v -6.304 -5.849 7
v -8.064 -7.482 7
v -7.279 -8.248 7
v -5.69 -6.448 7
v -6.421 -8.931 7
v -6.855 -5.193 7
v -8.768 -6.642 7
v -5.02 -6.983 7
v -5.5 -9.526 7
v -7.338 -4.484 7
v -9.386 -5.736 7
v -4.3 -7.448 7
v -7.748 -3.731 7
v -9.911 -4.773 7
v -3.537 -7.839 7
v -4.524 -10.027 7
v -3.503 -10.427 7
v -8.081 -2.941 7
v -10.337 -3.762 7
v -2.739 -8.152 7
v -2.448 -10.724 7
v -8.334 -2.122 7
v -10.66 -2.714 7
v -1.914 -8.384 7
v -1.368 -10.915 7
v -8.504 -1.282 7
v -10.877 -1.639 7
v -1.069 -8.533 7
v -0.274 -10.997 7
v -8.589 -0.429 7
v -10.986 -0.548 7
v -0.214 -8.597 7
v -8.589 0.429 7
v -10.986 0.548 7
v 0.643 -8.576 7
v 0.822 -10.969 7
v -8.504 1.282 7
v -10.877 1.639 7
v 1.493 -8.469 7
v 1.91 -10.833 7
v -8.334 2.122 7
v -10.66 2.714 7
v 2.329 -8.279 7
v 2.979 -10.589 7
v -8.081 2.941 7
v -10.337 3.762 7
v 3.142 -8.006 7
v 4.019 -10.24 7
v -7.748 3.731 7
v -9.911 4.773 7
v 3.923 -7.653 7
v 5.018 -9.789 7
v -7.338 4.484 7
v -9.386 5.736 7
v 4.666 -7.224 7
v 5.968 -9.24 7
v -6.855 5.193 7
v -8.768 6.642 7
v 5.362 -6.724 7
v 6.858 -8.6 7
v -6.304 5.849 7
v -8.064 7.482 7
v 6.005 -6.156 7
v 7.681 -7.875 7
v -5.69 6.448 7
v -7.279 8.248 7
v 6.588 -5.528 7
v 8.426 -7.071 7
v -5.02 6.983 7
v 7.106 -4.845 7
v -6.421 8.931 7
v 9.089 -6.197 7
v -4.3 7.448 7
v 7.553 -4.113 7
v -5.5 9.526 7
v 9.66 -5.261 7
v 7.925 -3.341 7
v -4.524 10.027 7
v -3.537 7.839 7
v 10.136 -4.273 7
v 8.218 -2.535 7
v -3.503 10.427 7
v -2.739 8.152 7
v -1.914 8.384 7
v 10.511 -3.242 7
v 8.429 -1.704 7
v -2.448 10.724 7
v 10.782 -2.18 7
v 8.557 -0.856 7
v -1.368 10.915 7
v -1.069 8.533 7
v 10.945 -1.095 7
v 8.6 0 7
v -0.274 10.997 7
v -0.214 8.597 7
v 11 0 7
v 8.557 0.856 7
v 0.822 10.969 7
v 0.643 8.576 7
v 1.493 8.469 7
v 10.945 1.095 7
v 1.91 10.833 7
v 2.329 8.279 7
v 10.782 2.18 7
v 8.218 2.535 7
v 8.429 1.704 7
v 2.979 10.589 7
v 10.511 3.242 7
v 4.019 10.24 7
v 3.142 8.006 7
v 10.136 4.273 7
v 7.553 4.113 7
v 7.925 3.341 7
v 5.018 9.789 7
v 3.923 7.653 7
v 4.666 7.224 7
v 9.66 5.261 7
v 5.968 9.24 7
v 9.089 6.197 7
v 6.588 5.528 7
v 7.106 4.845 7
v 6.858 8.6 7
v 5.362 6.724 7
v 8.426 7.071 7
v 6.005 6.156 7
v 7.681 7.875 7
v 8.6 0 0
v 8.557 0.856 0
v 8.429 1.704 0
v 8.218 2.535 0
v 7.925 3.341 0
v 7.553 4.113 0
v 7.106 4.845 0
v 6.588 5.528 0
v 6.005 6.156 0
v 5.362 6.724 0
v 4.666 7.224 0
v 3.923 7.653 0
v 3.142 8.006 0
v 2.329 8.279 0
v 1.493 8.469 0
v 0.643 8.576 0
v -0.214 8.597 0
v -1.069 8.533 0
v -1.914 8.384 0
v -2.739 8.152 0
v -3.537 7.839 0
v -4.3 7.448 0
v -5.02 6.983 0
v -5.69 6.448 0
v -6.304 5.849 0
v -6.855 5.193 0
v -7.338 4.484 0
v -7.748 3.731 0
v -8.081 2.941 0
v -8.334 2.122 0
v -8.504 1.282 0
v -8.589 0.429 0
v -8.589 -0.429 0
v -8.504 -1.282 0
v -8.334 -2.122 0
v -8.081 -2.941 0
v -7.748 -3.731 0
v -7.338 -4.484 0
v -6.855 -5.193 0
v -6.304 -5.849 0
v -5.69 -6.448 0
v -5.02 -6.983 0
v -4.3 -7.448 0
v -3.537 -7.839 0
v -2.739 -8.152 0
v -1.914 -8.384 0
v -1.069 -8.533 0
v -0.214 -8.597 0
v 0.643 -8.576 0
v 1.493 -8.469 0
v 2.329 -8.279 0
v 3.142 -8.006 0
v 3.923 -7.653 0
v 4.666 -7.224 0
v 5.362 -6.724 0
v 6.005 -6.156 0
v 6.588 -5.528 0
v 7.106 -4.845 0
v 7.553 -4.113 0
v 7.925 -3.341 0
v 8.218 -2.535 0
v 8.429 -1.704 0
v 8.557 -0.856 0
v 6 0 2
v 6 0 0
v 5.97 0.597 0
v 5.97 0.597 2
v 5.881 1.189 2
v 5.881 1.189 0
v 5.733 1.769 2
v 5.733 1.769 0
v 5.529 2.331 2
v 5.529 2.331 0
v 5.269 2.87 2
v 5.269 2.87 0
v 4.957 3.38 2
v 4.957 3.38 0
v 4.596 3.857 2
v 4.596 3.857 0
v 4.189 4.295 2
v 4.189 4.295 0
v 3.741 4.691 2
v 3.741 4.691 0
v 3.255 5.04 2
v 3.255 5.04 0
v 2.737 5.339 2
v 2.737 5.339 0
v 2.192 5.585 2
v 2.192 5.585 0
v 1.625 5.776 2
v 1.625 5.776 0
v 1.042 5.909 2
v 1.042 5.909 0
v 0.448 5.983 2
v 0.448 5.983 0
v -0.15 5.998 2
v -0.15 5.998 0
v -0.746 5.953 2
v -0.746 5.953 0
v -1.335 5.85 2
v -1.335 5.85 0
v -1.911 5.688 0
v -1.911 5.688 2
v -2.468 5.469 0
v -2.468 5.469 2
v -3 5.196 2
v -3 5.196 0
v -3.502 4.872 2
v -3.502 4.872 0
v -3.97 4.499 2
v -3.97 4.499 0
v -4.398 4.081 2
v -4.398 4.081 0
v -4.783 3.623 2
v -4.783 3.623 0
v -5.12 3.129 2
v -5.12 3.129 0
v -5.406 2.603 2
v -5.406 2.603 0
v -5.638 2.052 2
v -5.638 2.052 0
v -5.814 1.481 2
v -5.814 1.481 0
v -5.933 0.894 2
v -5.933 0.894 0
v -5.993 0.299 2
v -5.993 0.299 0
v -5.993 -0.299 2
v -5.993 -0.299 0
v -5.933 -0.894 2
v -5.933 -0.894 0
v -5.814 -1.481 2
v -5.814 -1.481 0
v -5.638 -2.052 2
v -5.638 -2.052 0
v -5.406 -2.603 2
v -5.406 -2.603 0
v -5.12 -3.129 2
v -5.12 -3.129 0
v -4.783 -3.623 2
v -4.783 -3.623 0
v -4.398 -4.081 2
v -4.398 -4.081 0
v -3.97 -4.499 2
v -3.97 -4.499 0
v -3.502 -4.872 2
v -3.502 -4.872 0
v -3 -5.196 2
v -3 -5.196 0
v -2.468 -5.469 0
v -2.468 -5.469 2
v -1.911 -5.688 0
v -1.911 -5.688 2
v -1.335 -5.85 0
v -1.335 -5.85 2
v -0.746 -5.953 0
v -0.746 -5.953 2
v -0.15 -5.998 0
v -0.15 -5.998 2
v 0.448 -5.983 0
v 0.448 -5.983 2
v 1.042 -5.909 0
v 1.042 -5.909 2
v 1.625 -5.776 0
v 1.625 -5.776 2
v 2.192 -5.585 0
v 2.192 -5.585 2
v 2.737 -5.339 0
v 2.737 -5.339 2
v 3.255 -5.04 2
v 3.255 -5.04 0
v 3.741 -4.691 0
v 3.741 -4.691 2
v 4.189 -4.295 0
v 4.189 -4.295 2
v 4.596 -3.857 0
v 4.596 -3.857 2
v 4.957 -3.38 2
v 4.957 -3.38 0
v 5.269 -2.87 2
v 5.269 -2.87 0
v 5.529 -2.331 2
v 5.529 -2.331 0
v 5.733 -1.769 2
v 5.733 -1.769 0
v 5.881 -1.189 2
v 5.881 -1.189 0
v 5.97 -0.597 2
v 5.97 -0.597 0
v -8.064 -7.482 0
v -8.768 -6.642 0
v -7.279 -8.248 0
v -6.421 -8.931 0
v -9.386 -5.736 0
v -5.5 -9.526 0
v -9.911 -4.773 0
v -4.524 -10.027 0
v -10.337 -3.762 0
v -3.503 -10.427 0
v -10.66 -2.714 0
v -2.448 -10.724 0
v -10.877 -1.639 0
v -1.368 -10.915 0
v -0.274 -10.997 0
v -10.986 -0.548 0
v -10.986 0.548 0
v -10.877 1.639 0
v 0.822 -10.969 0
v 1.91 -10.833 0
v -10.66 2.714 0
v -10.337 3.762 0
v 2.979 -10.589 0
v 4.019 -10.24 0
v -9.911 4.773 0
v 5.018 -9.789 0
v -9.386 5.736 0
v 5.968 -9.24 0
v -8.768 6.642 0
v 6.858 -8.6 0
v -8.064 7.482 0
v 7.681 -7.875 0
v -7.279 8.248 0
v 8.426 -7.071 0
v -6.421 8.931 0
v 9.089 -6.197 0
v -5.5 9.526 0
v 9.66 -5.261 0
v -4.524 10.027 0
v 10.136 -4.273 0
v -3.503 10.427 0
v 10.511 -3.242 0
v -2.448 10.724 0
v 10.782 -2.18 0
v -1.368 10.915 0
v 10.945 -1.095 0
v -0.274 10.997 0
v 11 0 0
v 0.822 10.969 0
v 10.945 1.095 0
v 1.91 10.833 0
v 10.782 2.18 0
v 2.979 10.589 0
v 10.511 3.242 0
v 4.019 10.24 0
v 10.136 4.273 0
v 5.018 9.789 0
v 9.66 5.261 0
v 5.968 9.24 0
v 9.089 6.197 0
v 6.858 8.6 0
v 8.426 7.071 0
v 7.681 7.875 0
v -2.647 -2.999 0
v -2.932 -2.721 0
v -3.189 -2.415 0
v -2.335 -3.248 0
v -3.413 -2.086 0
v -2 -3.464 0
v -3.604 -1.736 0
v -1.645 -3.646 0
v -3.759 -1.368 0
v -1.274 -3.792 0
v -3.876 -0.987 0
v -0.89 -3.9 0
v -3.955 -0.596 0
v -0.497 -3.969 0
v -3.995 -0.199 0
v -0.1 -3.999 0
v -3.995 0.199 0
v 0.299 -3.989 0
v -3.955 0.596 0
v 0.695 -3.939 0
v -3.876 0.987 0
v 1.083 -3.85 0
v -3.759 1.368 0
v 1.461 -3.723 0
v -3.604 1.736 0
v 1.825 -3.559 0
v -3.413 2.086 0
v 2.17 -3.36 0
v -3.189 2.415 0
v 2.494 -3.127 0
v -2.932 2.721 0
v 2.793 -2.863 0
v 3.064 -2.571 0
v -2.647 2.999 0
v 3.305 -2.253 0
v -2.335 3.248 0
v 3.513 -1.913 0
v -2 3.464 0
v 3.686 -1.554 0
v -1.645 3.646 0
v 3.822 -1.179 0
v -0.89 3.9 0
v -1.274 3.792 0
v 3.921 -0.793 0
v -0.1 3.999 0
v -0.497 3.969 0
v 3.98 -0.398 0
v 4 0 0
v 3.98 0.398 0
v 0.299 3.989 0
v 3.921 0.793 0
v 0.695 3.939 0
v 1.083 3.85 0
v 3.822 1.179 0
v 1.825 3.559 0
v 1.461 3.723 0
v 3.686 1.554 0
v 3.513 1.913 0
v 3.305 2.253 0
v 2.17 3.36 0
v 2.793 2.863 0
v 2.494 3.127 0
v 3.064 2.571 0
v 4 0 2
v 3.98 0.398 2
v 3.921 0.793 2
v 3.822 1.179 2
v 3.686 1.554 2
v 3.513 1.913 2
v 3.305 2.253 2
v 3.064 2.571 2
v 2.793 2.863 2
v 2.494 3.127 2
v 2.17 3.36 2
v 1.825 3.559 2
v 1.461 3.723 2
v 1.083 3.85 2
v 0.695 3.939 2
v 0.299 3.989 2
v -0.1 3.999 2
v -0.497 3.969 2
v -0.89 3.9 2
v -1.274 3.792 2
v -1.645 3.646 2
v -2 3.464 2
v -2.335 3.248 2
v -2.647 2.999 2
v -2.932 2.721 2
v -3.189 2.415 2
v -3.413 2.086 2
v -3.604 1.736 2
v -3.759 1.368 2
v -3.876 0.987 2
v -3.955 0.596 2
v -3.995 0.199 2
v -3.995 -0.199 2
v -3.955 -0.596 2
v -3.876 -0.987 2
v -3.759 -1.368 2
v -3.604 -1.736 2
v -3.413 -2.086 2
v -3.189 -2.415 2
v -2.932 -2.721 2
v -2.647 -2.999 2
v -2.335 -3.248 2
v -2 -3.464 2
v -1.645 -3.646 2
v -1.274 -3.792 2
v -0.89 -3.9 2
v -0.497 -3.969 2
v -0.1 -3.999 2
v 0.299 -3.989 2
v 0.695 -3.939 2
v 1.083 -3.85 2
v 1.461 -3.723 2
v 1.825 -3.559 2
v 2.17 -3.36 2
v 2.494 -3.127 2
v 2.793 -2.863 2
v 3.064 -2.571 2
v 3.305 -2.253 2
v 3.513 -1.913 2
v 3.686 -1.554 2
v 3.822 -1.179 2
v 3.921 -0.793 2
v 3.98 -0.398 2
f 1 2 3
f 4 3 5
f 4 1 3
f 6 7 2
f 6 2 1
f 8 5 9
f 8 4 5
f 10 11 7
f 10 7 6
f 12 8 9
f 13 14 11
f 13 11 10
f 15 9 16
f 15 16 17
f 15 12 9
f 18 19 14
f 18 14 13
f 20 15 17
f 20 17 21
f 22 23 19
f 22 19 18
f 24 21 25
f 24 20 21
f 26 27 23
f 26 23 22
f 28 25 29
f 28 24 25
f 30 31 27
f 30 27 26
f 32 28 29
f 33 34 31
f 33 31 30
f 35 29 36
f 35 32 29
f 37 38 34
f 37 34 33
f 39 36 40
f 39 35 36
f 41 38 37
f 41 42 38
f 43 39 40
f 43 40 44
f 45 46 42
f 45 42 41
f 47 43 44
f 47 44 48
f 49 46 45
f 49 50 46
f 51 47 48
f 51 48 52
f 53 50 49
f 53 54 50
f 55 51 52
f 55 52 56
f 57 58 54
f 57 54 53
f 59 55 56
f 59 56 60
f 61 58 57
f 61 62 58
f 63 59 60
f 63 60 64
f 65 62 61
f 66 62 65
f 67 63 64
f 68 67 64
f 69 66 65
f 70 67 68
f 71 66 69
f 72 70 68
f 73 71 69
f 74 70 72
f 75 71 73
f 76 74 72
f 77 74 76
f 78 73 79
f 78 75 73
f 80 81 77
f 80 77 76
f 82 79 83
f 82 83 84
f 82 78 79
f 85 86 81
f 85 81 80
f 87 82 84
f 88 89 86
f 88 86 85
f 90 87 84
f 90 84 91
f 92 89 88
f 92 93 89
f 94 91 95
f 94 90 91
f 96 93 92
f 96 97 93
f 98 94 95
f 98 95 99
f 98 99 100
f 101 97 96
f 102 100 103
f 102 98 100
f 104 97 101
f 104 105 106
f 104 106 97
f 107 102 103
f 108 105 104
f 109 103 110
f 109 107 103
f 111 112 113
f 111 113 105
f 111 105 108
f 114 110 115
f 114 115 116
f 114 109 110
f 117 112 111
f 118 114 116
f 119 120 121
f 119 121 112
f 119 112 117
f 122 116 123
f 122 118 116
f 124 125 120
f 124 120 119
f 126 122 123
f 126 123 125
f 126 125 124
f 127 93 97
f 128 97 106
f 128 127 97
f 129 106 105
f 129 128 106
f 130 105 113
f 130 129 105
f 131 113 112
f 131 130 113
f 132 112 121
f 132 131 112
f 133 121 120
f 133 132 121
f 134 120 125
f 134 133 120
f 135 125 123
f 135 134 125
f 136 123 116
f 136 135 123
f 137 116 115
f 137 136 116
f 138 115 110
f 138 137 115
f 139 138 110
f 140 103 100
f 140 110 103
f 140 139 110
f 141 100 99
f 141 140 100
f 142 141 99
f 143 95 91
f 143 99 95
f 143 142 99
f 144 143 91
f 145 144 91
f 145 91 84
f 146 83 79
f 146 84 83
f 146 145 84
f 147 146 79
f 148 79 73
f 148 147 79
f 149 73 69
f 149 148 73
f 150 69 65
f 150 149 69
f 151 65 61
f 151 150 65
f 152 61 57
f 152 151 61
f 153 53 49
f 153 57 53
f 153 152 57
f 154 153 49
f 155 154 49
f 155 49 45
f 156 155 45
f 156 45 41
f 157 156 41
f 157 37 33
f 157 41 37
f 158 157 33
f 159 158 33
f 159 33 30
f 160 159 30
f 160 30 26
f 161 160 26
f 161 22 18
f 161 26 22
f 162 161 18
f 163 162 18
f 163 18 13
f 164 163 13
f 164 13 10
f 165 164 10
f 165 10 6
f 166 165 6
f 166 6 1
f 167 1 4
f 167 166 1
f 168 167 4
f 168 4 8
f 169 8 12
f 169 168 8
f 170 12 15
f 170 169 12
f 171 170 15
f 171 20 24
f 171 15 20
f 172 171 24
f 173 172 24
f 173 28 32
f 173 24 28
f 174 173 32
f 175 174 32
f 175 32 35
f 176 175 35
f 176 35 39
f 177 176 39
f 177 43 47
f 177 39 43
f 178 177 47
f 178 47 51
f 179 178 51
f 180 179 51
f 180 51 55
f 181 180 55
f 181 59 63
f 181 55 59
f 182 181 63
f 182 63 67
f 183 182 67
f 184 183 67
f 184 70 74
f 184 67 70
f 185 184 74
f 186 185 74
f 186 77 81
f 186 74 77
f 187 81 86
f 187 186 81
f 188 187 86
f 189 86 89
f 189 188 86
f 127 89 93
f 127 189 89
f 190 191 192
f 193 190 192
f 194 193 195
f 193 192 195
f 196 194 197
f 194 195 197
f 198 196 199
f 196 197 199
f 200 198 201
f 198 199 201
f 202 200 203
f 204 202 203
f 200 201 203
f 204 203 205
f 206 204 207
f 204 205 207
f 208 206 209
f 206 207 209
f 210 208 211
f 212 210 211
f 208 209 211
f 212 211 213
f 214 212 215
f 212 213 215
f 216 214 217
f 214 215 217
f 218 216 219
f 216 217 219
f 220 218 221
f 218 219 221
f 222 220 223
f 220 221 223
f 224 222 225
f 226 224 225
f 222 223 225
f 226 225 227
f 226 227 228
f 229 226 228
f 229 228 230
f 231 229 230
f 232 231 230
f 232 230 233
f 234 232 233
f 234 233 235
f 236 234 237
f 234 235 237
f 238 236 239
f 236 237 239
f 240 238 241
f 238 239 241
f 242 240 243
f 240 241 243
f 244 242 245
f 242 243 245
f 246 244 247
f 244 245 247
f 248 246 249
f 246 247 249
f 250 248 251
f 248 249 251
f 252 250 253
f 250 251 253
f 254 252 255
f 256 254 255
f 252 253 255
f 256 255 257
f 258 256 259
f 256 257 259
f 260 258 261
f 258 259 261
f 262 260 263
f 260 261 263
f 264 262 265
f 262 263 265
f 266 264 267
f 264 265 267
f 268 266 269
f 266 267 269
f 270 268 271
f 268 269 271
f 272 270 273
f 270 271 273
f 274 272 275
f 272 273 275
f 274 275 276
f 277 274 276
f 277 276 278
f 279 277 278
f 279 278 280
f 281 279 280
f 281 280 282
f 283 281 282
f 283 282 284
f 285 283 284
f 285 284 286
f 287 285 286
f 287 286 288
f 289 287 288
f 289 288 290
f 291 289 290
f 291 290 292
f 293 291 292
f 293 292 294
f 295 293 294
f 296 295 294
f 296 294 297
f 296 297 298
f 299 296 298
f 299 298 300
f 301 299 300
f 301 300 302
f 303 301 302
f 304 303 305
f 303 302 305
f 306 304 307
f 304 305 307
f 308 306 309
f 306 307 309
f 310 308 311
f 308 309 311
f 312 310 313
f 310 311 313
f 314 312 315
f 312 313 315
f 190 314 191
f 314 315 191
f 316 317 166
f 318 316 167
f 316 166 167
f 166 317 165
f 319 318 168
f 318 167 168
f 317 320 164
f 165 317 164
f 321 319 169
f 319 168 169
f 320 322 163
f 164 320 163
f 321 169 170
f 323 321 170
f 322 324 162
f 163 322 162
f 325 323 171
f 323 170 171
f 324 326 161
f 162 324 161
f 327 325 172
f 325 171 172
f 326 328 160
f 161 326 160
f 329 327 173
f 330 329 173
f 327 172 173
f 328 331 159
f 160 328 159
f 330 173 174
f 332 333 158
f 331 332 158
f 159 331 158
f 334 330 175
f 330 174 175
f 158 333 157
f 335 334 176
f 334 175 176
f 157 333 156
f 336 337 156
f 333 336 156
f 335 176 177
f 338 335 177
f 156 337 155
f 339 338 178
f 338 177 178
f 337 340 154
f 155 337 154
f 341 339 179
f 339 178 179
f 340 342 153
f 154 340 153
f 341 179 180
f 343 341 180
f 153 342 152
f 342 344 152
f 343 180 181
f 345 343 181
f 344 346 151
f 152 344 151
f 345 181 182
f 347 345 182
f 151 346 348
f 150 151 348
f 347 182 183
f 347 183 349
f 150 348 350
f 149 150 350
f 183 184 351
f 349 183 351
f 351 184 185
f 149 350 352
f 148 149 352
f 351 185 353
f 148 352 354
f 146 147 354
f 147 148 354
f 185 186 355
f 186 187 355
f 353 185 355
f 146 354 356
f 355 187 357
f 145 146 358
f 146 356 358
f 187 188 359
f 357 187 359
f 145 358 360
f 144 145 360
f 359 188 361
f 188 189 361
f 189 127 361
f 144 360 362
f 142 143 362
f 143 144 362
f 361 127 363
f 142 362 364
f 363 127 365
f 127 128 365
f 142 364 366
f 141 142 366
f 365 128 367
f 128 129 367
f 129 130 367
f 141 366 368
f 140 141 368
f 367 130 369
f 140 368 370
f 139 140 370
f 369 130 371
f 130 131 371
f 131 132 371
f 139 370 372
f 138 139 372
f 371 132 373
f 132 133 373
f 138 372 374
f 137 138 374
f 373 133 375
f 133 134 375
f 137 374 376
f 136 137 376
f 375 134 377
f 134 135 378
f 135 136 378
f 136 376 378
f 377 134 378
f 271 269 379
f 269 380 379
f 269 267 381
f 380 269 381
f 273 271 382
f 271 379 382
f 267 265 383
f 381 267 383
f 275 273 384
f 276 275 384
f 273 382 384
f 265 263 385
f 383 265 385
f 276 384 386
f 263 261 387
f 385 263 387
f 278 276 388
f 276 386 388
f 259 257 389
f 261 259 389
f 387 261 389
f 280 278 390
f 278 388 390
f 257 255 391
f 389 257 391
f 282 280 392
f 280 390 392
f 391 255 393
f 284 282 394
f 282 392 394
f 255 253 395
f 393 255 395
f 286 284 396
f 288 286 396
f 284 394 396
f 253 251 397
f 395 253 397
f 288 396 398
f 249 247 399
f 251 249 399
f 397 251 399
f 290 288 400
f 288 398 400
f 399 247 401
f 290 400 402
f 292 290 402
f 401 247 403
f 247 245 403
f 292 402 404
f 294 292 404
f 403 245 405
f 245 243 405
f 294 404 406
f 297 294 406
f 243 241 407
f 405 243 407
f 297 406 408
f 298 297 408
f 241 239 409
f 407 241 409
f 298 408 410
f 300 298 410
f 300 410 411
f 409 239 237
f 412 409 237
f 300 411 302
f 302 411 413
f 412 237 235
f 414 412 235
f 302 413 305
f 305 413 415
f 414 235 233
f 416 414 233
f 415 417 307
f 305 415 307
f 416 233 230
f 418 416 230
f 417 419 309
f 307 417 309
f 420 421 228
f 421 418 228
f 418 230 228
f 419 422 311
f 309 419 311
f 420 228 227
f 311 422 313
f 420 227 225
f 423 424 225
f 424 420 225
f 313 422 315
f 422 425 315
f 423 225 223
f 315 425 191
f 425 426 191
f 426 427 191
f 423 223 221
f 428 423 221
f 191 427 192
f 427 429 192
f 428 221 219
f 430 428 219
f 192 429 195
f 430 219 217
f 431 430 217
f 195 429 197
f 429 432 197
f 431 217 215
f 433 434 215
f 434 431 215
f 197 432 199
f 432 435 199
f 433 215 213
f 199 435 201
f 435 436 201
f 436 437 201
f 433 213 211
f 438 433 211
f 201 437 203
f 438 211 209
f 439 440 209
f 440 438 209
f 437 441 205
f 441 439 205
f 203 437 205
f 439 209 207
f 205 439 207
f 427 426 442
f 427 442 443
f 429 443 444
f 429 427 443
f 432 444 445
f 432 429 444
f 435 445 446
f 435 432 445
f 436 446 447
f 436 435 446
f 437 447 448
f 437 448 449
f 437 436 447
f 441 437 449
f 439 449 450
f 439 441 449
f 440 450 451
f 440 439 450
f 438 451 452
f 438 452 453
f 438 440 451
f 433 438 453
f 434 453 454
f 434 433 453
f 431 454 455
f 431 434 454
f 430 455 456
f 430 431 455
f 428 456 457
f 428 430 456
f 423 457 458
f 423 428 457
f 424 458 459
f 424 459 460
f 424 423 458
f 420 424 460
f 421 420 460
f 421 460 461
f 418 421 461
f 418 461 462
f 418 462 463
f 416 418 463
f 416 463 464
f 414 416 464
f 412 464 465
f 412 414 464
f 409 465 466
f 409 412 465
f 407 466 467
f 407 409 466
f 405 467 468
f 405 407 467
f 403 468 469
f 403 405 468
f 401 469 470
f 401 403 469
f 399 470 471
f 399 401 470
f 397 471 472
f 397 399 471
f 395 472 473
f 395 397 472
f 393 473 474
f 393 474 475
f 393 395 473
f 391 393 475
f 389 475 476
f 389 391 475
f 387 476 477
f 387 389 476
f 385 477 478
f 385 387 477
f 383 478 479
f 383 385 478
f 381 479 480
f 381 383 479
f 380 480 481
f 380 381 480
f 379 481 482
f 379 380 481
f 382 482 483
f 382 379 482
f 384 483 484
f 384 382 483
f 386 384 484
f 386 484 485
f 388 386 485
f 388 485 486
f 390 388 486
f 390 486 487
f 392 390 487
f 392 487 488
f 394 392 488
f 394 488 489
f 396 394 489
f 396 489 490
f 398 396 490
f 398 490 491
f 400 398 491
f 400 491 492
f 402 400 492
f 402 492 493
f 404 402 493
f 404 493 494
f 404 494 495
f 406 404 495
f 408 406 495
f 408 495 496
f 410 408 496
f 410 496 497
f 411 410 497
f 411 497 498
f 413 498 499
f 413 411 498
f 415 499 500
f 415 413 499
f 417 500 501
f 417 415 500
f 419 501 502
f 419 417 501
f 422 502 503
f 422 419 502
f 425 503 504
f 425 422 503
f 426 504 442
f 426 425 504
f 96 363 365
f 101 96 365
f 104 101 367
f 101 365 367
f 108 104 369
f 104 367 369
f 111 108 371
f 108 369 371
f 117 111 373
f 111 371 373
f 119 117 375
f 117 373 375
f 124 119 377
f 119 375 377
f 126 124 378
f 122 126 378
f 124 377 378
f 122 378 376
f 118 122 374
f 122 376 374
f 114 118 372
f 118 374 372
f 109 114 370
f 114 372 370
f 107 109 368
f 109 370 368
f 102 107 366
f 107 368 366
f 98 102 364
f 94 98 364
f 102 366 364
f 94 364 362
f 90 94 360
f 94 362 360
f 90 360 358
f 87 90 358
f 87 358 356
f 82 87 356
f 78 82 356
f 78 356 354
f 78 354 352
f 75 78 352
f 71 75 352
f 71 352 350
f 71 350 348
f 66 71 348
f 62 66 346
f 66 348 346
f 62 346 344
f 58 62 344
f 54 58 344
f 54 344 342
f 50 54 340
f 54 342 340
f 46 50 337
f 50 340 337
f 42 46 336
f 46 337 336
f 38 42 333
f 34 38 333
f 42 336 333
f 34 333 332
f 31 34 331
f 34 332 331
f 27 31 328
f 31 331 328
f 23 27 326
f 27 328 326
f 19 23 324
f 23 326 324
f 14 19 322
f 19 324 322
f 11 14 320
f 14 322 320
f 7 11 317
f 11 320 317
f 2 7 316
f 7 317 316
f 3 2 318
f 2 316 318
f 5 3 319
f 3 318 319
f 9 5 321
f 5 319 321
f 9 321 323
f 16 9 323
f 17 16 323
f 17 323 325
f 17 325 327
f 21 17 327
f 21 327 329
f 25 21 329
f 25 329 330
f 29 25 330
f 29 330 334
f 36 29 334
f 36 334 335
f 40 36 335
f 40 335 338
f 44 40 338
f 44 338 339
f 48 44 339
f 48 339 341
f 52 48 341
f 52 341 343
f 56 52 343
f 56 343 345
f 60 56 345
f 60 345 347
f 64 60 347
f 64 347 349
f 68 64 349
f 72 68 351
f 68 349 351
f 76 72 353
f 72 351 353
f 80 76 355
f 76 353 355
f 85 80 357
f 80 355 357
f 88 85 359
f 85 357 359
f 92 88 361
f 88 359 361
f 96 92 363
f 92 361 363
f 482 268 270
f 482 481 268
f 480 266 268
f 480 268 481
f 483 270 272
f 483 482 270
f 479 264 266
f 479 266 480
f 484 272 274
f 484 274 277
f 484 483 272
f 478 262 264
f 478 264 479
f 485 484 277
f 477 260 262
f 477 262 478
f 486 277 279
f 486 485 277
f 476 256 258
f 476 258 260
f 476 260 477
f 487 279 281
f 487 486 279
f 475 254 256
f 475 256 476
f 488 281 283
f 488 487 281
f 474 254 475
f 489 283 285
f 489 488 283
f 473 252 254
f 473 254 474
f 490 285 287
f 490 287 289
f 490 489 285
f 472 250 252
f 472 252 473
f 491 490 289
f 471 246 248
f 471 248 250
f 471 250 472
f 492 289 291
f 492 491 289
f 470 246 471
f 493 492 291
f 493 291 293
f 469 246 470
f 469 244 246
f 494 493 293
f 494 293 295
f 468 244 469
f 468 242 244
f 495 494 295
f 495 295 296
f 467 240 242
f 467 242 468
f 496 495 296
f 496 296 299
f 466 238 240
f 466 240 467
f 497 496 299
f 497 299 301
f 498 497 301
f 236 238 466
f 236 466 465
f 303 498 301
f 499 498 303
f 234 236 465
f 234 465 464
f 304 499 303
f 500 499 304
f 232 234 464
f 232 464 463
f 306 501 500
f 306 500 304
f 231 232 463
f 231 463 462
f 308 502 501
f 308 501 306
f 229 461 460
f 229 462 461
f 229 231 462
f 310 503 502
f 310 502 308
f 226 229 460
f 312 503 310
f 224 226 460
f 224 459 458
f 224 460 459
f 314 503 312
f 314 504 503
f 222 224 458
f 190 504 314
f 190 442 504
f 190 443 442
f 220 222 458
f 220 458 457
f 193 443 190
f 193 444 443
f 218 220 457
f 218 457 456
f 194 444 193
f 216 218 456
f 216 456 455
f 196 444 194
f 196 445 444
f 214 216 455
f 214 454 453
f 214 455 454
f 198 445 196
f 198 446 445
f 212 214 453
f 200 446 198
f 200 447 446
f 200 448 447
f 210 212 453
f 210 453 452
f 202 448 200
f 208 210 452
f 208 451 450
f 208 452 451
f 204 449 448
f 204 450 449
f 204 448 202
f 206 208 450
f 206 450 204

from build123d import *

# Parameters (mm, degrees)
F0_R     = 11
F1_DEPTH = 7
F2_R     = 8.6
F3_DEPTH = 18.2
F4_R     = 6
F4_R_2   = 4
F5_DEPTH = 2


with BuildPart() as f1:
    # F0 (on Top) → F1 (new body)
    with BuildSketch(Plane.XY):
        Circle(F0_R)
    extrude(amount=F1_DEPTH)

    # F2 (on Top) → F3 (cut)
    with BuildSketch(Plane.XY):
        Circle(F2_R)
    extrude(amount=F3_DEPTH, mode=Mode.SUBTRACT)


with BuildPart() as f5:
    # F4 (on Top) → F5 (new body)
    with BuildSketch(Plane.XY):
        Circle(F4_R)
        Circle(F4_R_2, mode=Mode.SUBTRACT)
    extrude(amount=F5_DEPTH)


solid = Compound([f1.part, f5.part])
